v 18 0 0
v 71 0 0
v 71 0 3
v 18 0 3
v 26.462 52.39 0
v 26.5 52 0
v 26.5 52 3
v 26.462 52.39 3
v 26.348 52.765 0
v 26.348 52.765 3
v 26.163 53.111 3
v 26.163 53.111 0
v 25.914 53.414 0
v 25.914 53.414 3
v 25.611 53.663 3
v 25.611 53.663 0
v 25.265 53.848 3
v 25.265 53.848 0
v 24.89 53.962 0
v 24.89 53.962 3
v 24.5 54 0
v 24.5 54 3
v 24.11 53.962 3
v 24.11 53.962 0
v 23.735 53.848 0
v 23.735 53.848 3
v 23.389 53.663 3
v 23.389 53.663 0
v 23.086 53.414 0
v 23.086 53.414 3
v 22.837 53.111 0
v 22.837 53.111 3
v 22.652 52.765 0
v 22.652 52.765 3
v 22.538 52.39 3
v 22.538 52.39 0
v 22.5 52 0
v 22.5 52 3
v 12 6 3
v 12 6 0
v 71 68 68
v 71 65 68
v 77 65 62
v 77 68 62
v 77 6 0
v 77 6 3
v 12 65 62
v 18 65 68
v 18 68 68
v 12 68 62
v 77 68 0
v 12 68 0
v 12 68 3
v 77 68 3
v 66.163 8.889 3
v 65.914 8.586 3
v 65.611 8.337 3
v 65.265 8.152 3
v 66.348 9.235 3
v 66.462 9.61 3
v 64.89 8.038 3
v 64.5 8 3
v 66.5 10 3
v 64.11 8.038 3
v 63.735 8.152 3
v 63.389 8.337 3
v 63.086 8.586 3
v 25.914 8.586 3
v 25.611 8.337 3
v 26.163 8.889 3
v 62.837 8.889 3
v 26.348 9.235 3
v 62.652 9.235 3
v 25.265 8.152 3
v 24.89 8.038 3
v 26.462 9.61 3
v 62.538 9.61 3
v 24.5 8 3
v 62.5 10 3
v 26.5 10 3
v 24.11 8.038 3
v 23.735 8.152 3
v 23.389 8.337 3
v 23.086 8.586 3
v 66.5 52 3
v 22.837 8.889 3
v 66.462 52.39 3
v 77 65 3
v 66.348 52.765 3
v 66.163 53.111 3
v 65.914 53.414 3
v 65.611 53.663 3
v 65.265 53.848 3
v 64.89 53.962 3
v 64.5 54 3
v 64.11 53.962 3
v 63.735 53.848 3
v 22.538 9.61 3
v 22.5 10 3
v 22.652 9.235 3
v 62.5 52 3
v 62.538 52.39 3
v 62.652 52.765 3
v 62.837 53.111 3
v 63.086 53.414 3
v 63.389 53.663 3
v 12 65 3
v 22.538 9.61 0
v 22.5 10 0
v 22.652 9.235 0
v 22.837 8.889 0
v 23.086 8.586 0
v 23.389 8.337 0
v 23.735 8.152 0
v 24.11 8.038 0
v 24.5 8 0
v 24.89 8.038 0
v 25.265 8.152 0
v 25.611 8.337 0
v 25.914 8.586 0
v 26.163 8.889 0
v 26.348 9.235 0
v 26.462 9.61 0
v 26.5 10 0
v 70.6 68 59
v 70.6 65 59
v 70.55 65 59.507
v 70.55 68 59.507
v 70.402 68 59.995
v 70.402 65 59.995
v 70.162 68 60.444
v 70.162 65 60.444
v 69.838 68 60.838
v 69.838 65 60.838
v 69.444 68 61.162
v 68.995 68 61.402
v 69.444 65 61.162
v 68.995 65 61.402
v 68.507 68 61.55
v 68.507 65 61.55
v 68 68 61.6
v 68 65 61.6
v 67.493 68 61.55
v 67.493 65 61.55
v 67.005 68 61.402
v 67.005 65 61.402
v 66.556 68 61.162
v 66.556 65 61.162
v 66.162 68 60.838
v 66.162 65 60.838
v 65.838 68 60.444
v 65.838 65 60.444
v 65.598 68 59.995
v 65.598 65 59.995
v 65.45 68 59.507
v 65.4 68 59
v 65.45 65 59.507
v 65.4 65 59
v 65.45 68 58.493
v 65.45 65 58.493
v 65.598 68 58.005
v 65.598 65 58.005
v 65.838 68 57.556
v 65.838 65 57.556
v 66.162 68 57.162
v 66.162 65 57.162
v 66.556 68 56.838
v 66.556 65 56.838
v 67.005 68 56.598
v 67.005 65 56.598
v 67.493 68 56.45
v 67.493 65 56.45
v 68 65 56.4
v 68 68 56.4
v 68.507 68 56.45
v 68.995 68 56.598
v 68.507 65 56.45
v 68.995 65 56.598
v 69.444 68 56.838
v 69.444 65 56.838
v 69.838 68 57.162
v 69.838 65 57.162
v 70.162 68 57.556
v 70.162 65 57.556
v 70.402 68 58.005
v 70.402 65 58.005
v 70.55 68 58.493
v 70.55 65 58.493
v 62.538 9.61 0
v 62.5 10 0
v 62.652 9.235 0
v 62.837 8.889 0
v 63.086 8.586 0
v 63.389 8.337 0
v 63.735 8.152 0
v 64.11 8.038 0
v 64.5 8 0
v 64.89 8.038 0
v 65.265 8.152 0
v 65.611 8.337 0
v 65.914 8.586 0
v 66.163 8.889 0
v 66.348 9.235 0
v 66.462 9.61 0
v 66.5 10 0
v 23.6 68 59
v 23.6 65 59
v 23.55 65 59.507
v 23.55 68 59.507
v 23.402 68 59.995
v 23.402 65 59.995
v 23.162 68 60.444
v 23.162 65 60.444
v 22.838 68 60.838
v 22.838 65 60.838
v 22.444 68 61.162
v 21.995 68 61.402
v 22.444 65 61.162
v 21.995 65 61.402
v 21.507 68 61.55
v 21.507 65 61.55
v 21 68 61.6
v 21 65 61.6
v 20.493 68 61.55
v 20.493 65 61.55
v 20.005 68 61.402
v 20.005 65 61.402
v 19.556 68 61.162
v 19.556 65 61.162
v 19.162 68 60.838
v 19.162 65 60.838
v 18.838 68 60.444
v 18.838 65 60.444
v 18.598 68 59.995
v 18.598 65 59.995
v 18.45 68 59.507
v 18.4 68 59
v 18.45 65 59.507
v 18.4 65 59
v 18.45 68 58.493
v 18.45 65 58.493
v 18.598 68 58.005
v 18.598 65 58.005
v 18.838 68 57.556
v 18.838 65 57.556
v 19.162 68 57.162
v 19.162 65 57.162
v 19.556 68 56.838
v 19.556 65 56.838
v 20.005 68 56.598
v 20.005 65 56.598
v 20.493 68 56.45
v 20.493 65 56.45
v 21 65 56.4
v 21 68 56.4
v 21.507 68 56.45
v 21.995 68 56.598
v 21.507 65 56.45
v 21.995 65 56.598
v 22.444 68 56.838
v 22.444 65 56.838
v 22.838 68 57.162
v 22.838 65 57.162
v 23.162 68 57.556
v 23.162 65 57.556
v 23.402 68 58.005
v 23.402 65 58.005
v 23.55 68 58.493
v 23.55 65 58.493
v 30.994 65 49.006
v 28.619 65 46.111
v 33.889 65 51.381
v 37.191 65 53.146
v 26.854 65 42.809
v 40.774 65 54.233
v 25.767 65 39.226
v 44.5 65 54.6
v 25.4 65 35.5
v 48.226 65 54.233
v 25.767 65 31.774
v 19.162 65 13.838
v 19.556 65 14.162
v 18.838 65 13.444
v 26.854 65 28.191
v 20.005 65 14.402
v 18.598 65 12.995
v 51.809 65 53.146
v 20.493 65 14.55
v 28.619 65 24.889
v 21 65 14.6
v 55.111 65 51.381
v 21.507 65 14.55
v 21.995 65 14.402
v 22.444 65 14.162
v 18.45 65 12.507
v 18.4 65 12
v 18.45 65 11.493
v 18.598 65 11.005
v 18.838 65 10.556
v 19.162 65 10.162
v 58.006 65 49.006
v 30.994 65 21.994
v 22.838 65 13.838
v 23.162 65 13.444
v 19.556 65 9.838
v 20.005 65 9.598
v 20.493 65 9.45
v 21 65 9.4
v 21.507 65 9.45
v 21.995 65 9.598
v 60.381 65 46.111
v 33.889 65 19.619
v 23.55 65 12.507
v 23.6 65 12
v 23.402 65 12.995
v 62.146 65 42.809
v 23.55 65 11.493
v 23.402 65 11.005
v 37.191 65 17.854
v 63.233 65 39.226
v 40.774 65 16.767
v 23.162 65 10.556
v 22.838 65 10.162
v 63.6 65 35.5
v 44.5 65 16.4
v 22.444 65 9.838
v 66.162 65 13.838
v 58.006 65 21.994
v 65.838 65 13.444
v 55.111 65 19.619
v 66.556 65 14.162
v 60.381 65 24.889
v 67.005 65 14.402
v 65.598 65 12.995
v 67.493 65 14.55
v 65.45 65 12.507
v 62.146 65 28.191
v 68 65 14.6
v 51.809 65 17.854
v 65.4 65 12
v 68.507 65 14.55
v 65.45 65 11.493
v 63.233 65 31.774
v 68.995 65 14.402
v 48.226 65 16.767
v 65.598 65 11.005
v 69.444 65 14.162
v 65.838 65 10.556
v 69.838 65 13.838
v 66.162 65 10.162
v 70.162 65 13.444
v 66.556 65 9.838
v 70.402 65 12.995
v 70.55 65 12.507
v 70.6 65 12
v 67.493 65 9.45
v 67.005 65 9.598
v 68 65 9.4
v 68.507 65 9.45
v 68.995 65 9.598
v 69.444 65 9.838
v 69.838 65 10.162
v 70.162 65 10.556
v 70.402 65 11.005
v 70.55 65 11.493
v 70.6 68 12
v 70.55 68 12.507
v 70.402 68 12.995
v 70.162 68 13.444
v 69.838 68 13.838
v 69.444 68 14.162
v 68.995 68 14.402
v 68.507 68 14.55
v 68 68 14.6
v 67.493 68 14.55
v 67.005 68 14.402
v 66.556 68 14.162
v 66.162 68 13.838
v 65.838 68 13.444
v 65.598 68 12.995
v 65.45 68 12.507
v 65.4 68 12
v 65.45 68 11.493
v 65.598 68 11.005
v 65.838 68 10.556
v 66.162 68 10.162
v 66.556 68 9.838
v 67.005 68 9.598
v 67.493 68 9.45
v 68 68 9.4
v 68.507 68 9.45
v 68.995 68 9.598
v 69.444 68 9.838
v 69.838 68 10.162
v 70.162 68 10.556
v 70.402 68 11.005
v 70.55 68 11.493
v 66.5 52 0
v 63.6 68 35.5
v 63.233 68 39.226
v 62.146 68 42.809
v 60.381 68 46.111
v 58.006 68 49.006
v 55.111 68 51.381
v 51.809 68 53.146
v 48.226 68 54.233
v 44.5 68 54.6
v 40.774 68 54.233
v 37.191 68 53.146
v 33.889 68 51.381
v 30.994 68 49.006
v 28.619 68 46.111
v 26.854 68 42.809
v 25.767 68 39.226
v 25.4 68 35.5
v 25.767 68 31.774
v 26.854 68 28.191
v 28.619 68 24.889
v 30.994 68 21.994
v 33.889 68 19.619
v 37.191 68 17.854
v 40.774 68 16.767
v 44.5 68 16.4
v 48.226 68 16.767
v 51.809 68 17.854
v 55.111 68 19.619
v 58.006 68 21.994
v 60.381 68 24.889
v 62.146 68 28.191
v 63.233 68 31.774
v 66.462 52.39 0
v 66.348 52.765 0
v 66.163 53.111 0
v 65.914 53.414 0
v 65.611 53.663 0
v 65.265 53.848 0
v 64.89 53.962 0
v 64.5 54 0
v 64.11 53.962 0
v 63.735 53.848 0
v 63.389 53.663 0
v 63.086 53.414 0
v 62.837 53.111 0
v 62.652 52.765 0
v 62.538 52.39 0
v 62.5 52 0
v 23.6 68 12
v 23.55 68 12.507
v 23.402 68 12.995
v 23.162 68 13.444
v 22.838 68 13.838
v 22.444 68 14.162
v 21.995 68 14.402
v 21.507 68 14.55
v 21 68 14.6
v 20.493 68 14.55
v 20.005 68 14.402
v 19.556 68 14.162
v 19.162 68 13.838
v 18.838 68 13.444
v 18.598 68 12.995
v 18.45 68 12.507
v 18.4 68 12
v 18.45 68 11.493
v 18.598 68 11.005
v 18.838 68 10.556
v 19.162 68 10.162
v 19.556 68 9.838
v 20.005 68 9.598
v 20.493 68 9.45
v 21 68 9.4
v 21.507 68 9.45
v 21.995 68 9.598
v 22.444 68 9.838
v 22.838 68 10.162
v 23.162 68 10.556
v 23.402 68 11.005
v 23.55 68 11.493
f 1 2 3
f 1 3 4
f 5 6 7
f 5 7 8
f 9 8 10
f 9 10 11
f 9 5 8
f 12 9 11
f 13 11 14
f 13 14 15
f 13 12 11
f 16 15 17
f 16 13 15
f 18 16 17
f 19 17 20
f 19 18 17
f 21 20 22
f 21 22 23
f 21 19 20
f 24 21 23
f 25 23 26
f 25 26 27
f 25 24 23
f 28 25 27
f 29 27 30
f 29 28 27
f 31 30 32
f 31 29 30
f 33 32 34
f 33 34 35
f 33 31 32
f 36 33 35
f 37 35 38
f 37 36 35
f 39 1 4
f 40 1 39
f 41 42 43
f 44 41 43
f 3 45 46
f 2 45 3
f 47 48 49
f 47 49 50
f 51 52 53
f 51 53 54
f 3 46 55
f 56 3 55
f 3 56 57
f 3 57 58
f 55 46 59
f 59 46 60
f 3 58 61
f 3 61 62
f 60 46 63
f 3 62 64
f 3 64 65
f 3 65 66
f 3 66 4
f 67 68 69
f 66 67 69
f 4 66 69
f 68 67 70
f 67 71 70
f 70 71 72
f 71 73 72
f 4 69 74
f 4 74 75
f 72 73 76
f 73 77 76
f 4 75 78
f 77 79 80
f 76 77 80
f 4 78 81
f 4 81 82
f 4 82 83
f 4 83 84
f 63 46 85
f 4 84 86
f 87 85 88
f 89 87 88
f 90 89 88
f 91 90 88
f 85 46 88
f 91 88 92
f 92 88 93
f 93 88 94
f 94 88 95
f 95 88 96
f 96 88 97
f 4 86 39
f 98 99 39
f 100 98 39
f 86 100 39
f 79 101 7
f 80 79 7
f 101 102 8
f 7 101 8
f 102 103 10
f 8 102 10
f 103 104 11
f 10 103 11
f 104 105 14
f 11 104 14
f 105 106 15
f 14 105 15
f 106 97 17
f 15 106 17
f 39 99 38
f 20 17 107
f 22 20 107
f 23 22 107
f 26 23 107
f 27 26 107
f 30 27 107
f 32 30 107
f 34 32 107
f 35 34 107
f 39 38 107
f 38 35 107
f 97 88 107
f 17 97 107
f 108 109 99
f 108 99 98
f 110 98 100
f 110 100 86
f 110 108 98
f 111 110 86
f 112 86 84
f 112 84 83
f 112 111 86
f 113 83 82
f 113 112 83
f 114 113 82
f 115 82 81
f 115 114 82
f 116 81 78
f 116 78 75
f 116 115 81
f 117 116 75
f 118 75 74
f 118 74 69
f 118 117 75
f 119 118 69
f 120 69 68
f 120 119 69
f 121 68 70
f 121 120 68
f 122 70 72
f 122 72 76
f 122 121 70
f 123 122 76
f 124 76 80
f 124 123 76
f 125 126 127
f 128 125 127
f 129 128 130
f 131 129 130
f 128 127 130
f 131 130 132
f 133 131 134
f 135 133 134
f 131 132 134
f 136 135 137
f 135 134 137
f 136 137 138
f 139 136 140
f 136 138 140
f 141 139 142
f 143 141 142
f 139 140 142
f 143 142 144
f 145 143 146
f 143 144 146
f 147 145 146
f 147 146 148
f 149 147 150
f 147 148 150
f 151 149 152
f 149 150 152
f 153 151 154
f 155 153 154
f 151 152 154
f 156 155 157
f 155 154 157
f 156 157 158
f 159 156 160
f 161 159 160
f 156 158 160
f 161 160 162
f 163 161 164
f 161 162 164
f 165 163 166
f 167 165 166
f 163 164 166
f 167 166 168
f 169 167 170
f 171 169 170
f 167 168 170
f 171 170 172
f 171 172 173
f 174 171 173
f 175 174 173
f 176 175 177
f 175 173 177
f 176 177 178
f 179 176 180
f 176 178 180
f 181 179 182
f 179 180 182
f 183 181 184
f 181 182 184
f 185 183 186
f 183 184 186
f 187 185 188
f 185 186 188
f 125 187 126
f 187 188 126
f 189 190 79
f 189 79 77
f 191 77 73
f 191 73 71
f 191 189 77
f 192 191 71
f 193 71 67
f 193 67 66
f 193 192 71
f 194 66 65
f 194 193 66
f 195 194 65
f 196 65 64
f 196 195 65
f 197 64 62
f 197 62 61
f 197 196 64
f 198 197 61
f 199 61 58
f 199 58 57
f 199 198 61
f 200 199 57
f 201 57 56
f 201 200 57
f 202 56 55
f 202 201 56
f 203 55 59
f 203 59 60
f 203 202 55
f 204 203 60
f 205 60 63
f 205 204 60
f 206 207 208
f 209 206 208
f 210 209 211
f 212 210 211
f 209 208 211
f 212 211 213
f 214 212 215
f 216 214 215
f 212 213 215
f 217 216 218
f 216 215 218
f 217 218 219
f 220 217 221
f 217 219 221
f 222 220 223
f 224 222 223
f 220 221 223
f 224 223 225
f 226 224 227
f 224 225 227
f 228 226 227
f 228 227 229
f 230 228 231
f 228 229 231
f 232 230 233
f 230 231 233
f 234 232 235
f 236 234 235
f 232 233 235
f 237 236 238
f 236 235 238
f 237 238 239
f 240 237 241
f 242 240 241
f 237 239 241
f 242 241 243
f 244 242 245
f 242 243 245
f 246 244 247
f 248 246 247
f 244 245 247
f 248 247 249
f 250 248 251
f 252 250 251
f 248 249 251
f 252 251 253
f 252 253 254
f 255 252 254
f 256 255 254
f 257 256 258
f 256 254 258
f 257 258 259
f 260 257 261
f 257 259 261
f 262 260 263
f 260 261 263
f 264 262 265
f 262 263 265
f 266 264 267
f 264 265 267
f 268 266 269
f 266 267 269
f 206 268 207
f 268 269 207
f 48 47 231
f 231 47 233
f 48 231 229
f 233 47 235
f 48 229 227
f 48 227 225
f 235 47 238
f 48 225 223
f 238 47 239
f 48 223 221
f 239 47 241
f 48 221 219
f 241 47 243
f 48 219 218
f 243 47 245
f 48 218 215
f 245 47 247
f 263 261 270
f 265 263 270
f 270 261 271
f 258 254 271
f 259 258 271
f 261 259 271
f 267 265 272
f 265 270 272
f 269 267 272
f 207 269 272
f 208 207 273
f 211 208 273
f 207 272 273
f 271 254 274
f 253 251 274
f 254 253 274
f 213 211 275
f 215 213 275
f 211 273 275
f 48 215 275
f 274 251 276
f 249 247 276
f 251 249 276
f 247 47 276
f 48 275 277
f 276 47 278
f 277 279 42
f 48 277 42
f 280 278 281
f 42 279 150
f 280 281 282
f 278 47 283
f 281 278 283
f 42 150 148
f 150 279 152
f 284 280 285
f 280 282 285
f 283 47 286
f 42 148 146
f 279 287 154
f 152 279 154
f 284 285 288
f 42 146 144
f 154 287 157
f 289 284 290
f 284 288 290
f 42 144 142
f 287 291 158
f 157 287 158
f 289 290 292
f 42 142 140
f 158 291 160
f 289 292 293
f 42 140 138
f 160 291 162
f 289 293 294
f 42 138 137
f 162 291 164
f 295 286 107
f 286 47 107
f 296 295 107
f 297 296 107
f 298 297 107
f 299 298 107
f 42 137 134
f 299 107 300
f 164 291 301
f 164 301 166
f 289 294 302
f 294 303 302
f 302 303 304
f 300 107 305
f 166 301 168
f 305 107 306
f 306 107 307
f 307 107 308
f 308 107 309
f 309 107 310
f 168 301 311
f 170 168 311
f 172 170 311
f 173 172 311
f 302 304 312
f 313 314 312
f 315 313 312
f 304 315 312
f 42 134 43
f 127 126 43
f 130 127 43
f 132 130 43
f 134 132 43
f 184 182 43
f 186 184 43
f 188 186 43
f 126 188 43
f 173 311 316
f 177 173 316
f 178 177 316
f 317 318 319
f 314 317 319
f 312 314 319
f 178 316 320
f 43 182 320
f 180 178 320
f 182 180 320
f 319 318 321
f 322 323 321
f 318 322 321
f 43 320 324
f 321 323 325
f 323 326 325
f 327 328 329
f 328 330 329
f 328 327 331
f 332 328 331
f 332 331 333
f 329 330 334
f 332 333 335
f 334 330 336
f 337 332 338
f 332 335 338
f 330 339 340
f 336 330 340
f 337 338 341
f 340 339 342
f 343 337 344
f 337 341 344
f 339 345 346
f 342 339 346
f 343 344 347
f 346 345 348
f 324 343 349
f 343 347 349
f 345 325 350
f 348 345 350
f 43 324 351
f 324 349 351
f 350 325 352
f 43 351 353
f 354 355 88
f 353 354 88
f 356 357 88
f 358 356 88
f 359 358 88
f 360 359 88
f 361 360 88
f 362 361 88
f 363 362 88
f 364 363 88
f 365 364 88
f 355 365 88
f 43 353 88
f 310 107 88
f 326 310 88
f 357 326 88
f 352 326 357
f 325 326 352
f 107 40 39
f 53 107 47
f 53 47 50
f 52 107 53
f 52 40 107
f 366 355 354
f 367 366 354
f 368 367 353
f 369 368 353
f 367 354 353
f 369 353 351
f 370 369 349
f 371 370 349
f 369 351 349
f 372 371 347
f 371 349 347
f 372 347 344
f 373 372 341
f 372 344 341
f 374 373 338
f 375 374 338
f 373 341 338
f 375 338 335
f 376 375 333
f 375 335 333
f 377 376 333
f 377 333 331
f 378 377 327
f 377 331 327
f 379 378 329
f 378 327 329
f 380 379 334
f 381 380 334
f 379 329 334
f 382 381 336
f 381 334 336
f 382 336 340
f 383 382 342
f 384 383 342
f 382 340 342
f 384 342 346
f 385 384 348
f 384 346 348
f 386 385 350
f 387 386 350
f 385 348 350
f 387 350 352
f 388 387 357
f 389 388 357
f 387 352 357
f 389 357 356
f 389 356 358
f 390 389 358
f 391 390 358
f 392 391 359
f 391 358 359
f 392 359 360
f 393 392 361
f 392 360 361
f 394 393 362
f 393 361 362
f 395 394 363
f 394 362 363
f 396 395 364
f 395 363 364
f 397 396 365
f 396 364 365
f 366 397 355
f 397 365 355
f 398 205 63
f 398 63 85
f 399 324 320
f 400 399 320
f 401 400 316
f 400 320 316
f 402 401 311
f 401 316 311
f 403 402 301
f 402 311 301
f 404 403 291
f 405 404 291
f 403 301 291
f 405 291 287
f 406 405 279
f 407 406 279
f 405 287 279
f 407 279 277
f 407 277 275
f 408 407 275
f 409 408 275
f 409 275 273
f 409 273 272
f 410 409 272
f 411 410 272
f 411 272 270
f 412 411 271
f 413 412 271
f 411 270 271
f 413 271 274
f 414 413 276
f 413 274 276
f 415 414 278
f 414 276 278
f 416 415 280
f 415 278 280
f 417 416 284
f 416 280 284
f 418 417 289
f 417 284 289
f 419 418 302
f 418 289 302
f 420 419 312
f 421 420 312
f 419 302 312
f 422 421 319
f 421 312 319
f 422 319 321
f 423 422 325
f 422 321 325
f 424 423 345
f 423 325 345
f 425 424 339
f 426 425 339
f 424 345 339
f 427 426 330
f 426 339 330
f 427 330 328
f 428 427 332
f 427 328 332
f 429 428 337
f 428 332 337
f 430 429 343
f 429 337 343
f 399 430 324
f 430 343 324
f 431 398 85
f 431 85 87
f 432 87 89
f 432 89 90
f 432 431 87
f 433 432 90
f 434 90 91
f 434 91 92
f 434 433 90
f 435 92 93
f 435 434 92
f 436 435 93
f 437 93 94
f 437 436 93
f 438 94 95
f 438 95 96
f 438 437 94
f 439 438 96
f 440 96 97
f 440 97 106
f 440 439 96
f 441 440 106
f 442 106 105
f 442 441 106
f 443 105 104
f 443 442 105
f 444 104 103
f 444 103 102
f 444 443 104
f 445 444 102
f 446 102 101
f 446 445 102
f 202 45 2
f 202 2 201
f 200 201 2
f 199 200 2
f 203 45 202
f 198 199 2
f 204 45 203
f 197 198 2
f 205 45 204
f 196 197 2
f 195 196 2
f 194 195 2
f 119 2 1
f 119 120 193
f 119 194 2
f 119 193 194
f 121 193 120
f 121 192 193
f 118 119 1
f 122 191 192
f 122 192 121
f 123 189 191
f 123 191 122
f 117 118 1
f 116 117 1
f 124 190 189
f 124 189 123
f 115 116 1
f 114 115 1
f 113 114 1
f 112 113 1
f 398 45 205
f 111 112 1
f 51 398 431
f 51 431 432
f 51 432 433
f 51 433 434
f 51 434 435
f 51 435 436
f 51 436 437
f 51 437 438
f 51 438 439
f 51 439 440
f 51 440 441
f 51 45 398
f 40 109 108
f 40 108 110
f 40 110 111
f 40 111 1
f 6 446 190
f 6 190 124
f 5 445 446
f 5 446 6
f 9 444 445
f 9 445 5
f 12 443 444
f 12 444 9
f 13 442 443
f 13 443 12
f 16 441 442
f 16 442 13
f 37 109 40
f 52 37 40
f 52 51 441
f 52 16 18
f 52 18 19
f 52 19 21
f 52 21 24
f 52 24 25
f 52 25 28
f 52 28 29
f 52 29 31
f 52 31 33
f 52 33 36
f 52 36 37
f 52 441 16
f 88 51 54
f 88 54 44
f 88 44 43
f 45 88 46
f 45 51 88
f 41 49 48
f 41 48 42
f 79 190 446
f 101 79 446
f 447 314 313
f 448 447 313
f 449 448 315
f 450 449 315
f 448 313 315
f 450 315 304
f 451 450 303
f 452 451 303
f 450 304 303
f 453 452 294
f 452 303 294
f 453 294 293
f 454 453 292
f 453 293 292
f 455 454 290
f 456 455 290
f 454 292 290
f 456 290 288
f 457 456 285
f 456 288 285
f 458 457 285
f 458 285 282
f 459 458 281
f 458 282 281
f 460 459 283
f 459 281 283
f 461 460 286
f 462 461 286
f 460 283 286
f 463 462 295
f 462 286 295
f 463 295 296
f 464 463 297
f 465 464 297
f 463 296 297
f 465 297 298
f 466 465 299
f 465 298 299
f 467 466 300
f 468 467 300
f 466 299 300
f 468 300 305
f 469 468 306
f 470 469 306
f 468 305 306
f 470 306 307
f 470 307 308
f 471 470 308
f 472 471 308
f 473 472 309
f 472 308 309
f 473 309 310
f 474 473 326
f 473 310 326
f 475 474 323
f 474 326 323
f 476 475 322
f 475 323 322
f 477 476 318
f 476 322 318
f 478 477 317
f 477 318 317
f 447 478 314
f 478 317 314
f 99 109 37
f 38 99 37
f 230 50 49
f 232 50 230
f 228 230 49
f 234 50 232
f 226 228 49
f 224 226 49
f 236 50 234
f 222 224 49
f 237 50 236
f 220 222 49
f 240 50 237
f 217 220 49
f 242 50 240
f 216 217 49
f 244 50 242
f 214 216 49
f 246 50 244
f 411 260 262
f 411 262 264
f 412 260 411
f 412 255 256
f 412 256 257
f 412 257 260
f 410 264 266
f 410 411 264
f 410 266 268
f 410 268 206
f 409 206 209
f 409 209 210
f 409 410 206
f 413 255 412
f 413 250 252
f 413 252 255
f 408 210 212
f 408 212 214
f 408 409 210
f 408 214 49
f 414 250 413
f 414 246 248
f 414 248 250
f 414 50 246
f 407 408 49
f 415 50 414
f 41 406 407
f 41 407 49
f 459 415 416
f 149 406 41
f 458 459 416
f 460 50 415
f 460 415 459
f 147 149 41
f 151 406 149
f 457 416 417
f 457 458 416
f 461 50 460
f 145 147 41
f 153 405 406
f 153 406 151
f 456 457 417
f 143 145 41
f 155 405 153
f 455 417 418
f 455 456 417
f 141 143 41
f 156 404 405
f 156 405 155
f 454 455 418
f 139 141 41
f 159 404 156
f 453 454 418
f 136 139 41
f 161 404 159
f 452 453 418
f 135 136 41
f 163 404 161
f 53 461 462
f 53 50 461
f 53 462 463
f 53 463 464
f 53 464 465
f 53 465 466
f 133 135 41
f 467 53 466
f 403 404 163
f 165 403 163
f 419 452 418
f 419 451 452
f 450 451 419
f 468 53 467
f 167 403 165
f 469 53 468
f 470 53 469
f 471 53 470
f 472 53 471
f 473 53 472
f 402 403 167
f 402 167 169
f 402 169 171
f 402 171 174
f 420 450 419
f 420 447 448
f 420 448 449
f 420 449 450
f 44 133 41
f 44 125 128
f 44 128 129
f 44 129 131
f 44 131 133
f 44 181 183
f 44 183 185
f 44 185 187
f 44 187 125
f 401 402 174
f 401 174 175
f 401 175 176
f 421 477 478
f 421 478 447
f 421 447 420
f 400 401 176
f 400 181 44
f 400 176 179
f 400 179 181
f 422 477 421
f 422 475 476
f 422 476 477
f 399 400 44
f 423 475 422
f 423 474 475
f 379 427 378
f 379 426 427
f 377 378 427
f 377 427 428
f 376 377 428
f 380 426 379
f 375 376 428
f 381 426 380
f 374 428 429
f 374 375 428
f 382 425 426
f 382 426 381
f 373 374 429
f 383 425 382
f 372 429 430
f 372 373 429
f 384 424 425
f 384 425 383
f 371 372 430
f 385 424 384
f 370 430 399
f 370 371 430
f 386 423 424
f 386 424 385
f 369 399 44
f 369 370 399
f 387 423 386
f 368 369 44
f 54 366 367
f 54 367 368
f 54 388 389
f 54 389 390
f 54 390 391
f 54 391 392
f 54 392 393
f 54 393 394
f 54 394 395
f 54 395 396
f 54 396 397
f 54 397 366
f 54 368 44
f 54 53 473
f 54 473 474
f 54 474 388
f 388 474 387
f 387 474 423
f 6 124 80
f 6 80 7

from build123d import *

# Parameters (mm, degrees)
PAD005_DEPTH  = 3
SKETCH006_W   = 65
SKETCH006_H   = 3
PAD006_DEPTH  = 65
SKETCH007_R   = 2.6
SKETCH007_R_2 = 19.1
POCKET_DEPTH  = 3


with BuildPart() as part:
    # Sketch005 → Pad005 (new body)
    with BuildSketch(Plane.XY):
        Polygon((0, 68.000006), (65, 68.000006), (65, 6.000006), (59, 0), (6, 0), (0, 6.000006), align=None)
        with BuildLine():
            ThreePointArc((50.5, 10), (52.5, 8), (54.5, 10))
            Line((54.5, 10), (54.5, 52))
            ThreePointArc((54.5, 52), (52.5, 54), (50.5, 52))
            Line((50.5, 10), (50.5, 52))
        make_face(mode=Mode.SUBTRACT)
        with BuildLine():
            ThreePointArc((10.5, 10), (12.5, 8), (14.5, 10))
            Line((14.5, 10), (14.5, 52))
            ThreePointArc((14.5, 52), (12.5, 54), (10.5, 52))
            Line((10.5, 10), (10.5, 52))
        make_face(mode=Mode.SUBTRACT)
    extrude(amount=PAD005_DEPTH)

    # Sketch006 (on Face16 of Pad005) → Pad006 (join)
    with BuildSketch(Plane.XY.offset(3)):
        with Locations((32.5, 66.5)):
            Rectangle(SKETCH006_W, SKETCH006_H)
    extrude(amount=PAD006_DEPTH)

    # Sketch007 (on Face21 of Pad006) → Pocket (cut)
    with BuildSketch(Plane.XZ.offset(-65)):
        with Locations((9, 59)):
            Circle(SKETCH007_R)
        with Locations((32.5, 35.5)):
            Circle(SKETCH007_R_2)
        with Locations((56, 12)):
            Circle(SKETCH007_R)
        with Locations((56, 59)):
            Circle(SKETCH007_R)
        with Locations((56, 12)):
            Circle(SKETCH007_R)
        with Locations((9, 12)):
            Circle(SKETCH007_R)
        with Locations((9, 12)):
            Circle(SKETCH007_R)
        Polygon((0, 68), (6, 68), (0, 62), align=None)
        Polygon((65, 68), (59, 68), (65, 62), align=None)
    extrude(amount=-POCKET_DEPTH, mode=Mode.SUBTRACT)


with BuildPart() as part_1:
    # Body005 placement: moved
    add(part.part.moved(Location((12, 0, 0))))


solid = part_1.part
